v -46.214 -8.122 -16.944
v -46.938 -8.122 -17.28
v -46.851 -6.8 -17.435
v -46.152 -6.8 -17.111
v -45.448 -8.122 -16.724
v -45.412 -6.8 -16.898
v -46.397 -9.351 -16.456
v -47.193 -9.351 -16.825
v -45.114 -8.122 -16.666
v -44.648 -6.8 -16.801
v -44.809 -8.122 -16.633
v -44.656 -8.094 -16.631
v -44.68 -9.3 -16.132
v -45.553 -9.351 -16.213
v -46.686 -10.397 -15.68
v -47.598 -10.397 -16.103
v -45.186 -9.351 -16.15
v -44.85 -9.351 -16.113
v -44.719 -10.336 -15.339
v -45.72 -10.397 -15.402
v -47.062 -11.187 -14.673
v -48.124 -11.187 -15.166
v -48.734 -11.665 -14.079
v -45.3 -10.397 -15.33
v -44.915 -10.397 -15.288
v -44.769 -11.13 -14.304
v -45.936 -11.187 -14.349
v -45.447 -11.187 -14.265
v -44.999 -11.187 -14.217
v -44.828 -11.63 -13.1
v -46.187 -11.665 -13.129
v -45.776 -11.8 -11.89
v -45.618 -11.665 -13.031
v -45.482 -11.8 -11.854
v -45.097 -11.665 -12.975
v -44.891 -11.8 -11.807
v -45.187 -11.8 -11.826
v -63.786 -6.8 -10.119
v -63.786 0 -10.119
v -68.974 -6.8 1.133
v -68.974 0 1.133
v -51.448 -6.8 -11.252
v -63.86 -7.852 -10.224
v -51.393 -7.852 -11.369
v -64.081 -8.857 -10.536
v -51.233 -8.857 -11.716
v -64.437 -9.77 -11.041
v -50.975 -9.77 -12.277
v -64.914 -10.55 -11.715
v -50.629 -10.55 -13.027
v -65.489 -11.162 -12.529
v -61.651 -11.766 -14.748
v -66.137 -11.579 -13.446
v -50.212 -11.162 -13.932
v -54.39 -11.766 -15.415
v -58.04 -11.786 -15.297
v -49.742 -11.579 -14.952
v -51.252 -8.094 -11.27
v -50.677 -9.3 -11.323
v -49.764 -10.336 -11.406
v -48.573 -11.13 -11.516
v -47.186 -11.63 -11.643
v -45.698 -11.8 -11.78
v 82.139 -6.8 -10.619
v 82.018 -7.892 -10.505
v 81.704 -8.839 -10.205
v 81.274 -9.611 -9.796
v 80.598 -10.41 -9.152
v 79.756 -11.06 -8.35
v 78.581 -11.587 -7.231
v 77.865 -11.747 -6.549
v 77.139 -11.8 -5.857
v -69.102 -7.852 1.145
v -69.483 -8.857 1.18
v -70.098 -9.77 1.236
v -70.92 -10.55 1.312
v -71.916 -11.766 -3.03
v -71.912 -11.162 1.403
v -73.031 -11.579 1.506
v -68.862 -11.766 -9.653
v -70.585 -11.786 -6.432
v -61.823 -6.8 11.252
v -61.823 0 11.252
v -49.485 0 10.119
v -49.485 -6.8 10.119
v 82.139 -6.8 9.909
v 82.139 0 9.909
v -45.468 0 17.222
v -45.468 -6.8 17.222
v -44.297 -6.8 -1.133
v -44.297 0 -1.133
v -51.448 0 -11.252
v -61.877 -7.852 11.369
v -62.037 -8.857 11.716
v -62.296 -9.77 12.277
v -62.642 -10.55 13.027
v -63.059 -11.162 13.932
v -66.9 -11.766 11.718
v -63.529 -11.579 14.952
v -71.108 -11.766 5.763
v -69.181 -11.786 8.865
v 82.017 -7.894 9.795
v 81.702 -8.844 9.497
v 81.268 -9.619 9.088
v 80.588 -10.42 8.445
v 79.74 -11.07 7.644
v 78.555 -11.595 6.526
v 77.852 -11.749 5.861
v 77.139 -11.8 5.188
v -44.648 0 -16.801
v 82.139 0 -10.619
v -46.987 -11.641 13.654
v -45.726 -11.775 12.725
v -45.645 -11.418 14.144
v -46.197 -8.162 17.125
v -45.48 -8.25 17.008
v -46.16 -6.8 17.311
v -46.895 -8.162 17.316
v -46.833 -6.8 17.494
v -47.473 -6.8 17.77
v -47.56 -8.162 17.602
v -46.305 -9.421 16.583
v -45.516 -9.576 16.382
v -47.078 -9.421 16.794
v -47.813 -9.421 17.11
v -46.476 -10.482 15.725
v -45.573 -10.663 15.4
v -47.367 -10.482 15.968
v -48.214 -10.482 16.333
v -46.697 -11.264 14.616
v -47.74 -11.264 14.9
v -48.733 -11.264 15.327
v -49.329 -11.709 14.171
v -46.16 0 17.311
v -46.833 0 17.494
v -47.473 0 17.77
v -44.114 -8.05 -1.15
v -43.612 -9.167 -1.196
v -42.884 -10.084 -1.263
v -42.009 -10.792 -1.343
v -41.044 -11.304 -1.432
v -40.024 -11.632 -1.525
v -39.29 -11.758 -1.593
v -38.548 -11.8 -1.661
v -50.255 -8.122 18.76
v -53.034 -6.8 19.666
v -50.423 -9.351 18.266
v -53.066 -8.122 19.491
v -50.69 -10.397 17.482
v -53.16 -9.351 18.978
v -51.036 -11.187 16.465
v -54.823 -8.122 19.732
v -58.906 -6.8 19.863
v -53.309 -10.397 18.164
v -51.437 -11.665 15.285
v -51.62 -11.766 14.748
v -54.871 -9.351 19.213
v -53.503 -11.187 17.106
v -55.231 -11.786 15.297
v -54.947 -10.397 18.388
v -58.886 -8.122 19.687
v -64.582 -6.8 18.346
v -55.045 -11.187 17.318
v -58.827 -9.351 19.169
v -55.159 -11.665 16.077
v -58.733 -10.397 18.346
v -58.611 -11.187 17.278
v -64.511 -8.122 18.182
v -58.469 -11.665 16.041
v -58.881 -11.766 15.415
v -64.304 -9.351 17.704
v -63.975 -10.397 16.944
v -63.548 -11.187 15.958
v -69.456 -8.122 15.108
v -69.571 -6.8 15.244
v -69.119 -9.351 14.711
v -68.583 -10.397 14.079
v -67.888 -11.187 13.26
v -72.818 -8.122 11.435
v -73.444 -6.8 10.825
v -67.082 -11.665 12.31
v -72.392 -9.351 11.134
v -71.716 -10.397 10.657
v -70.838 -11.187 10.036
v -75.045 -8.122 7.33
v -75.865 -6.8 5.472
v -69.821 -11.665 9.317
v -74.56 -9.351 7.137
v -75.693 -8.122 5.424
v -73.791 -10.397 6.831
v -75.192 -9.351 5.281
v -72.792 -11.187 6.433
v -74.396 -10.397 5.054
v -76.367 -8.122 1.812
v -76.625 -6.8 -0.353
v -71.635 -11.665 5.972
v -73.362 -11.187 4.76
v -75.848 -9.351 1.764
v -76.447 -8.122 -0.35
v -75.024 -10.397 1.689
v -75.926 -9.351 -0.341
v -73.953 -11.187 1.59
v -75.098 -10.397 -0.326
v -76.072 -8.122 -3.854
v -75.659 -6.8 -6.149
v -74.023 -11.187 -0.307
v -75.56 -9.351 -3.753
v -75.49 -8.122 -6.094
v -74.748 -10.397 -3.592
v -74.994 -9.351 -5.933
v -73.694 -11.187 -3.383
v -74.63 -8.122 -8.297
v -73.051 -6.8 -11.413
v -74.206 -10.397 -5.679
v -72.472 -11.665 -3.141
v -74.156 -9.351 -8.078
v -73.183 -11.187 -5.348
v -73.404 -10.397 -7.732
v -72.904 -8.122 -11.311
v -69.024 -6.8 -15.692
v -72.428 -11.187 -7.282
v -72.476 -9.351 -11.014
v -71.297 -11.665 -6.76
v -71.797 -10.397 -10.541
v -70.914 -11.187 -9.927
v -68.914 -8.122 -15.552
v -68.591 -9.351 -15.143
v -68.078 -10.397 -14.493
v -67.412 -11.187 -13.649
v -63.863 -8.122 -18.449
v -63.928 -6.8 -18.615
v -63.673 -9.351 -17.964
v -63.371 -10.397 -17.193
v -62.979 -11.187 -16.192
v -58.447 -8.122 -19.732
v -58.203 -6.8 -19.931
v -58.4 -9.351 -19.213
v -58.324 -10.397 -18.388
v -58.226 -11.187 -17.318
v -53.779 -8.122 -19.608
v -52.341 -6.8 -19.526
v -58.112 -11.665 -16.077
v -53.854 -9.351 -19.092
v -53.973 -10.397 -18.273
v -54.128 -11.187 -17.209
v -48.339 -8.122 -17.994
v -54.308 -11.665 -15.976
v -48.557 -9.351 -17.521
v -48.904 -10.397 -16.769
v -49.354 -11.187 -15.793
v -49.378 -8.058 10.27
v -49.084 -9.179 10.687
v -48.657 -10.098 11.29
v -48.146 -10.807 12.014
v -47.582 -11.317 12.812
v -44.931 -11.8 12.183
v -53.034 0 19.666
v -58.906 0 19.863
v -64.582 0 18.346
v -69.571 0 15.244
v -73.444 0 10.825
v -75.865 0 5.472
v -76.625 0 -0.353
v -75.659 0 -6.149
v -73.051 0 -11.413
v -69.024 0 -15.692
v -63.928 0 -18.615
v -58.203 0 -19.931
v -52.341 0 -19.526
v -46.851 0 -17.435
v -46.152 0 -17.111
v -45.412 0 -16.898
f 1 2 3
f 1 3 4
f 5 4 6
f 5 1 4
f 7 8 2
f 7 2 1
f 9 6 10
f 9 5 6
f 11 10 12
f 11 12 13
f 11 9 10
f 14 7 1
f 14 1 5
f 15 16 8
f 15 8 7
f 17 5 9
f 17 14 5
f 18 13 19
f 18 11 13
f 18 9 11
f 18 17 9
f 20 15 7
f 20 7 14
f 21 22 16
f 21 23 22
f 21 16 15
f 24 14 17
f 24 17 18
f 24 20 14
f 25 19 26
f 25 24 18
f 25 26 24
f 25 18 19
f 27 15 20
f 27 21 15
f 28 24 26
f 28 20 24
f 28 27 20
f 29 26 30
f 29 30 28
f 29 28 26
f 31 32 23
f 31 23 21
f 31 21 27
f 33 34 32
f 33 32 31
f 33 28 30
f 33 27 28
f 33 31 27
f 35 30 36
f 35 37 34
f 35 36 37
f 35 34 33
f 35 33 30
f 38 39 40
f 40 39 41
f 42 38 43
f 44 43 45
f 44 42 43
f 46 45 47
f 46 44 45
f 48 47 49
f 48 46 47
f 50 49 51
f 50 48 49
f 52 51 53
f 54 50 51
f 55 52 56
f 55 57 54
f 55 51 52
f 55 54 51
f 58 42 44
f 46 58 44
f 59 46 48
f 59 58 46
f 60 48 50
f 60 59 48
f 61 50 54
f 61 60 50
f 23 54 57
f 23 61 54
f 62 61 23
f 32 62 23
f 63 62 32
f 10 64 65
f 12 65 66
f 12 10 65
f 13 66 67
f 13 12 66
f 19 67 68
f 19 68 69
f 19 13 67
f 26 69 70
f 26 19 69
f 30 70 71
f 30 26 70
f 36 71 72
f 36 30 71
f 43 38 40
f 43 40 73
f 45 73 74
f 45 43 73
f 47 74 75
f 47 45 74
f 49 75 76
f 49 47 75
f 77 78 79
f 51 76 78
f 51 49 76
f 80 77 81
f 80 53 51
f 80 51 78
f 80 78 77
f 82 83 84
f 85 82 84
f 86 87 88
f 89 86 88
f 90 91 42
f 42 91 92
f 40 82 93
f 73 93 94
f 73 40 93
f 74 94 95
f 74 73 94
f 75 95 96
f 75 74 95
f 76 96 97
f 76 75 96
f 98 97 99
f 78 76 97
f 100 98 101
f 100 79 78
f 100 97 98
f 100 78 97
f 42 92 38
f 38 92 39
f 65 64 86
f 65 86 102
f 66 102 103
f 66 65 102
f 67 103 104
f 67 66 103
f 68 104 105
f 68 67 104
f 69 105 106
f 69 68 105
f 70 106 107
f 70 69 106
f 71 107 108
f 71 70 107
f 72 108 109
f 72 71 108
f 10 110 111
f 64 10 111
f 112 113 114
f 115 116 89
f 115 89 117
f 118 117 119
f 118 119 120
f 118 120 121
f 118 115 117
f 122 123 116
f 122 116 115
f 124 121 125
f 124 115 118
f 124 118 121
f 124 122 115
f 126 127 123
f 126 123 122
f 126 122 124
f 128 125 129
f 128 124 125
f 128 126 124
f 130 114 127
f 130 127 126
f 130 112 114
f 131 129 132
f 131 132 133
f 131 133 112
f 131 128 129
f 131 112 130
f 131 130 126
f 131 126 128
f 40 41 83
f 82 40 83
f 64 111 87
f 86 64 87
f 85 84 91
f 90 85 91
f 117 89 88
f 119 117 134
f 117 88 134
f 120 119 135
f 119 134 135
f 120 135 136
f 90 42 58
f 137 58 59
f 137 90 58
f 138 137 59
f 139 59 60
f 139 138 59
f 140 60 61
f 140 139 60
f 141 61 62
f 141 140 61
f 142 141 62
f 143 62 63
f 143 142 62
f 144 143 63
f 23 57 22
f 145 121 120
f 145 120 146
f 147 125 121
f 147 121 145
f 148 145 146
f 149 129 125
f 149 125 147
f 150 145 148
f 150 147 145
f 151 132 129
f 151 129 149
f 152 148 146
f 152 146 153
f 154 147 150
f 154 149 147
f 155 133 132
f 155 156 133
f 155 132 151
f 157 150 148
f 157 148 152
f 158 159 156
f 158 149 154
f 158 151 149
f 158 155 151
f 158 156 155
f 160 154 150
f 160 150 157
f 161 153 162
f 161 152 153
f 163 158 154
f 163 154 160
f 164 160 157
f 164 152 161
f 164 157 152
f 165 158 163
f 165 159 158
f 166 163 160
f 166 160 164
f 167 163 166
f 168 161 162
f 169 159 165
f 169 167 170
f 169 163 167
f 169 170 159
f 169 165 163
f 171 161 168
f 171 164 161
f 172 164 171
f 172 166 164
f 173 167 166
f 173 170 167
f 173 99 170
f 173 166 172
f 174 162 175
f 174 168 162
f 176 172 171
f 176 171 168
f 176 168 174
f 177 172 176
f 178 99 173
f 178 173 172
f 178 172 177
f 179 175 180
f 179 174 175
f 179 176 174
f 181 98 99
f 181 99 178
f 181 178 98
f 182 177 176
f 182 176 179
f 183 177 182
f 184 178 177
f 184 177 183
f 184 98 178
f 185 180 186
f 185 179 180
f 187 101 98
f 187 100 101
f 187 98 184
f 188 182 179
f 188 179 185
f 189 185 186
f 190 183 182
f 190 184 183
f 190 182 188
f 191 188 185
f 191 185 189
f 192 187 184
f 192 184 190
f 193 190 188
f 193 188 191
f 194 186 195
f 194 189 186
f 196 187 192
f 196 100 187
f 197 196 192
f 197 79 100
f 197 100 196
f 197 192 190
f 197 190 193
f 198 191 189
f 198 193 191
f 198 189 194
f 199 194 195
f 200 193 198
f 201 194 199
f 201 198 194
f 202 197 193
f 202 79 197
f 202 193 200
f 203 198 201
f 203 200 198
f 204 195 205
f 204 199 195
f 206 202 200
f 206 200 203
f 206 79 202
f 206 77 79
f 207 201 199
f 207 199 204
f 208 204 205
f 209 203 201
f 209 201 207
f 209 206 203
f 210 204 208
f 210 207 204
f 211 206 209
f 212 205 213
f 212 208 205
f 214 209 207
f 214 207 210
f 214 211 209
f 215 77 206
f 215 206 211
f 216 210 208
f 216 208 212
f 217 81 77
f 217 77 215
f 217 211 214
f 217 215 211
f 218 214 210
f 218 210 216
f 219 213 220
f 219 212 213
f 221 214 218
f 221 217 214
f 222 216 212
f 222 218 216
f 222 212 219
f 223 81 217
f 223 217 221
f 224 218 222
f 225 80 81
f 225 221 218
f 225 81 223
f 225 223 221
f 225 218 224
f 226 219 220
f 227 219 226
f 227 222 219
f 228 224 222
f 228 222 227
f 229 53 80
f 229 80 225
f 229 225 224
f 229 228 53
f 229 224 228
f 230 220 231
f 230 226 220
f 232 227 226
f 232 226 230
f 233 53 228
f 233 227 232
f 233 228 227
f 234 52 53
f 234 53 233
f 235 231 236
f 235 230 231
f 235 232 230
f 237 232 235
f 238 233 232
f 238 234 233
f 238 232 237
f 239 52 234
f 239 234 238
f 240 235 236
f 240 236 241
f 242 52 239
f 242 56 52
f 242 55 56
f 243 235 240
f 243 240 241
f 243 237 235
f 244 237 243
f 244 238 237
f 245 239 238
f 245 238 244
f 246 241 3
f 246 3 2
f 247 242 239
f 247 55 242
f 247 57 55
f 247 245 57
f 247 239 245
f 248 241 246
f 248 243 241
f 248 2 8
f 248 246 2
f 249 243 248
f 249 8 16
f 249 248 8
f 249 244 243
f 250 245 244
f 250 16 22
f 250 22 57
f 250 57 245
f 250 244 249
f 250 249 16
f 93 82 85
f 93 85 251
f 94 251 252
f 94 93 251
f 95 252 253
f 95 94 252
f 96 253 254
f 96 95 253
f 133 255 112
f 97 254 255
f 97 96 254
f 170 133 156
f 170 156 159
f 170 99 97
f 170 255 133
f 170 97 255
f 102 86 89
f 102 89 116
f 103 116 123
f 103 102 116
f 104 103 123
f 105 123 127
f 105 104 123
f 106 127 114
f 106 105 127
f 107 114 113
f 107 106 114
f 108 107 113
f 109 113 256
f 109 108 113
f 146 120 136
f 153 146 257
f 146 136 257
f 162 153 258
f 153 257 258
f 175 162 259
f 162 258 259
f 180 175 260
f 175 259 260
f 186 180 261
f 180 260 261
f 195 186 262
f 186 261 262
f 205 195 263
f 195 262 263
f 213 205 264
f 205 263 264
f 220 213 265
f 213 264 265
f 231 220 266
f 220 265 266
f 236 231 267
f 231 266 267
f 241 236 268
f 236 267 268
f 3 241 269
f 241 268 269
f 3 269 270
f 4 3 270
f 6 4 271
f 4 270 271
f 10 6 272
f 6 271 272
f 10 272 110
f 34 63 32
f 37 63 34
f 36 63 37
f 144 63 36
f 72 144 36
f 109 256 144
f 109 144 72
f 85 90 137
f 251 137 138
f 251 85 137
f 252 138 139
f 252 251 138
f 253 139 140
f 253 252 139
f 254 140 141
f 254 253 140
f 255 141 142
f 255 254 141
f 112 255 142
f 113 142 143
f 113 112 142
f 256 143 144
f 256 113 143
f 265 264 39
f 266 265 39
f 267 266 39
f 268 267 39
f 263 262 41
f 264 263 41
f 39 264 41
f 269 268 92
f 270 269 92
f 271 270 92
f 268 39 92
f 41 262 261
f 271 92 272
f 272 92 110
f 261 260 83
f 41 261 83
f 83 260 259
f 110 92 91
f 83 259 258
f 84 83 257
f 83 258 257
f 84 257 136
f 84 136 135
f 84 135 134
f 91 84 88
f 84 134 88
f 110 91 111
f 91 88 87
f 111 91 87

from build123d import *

# Parameters (mm, degrees)
F1_DEPTH      = 11.8
F2_T3_ANGLE   = 23.9952218253
F2_T6_ANGLE   = 236.5757489995
F2_T9_ANGLE   = 26.5092715393
F2_T12_DEPTH  = 139.4367119933
F2_T15_DEPTH  = 45.5289069563
F2_T18_DEPTH  = 140.3160479541
F2_T21_DEPTH  = 37.3901770892
F2_T26_DEPTH  = 37.3901770892
F2_T31_DEPTH  = 37.3901770892
F2_T36_DEPTH  = 37.3901770892
F2_T41_DEPTH  = 37.3901770892
F2_T46_DEPTH  = 37.3901770892
F2_T52_DEPTH  = 37.3901770892
F2_T56_DEPTH  = 37.3901770892
F2_T62_DEPTH  = 37.3901770892
F2_T66_DEPTH  = 37.3901770892
F2_T72_DEPTH  = 37.3901770892
F2_T76_DEPTH  = 37.3901770892
F2_T82_DEPTH  = 37.3901770892
F2_T86_DEPTH  = 37.3901770892
F2_T92_DEPTH  = 37.3901770892
F2_T96_DEPTH  = 37.3901770892
F2_T102_DEPTH = 37.3901770892
F2_T106_DEPTH = 37.3901770892


# Not quite as in the source:
# - a fillet or chamfer that OpenCascade refuses, or shapes differently, is made with other operations: its cross-section is extruded or revolved along the edge and cut away or added


with BuildPart() as f1:
    # F0 (on Front) → F1 (new body)
    with BuildSketch(Plane.XZ):
        with BuildLine():
            ThreePointArc((-45.4681624589, 17.2222085509), (-46.4995658162, 17.3907127083), (-47.4734123647, 17.7699348549))
            ThreePointArc((-47.4734123647, 17.7699348549), (-76.6250444945, -0.3533911925), (-46.8510355825, -17.4349893659))
            ThreePointArc((-46.8510355825, -17.4349893659), (-45.7861203938, -16.9901072457), (-44.6475715962, -16.8012393137))
            Line((-44.6475715962, -16.8012393137), (82.1385234594, -10.6194149703))
            Line((82.1385234594, -10.6194149703), (82.1385234594, 9.909491986))
            Line((82.1385234594, 9.909491986), (-45.4681624589, 17.2222085509))
        make_face()
        Polygon((-49.4849642992, 10.1187057679), (-44.2971102089, -1.1330789012), (-51.4475145251, -11.2517846691), (-63.7857729316, -10.1187057679), (-68.9736270219, 1.1330789012), (-61.8232227057, 11.2517846691), align=None, mode=Mode.SUBTRACT)
    extrude(amount=F1_DEPTH)

    # F2: fillet of radius 5 on 12 edges, made by hand


with BuildPart() as f2_tool1:
    # F2_s2 → F2_t3 (revolve)
    with BuildSketch(Plane(origin=(-46.3030483671, 0, 2.6534743565), x_dir=(0, 1, 0), z_dir=(0.9983620051, 0, -0.0572128202))):
        with BuildLine():
            ThreePointArc((-6.8, 14.5926368593), (-10.3355339059, 13.1281707652), (-11.8, 9.5926368593))
            Line((-11.8, 9.5926368593), (-11.8, 14.5926368593))
            Line((-11.8, 14.5926368593), (-6.8, 14.5926368593))
        make_face()
    revolve(axis=Axis((-45.1820983581, -11.8, 22.2140185763), (0, 1, 0)), revolution_arc=F2_T3_ANGLE)


with BuildPart() as f2_tool4:
    # F2_s5 → F2_t6 (revolve)
    with BuildSketch(Plane(origin=(-44.7416696351, 0, 23.0682455015), x_dir=(0, 1, 0), z_dir=(0.8888167443, 0, -0.4582628013))):
        with BuildLine():
            ThreePointArc((-6.8, -5.9610832949), (-10.3355339059, -7.425549389), (-11.8, -10.9610832949))
            Line((-11.8, -10.9610832949), (-11.8, -5.9610832949))
            Line((-11.8, -5.9610832949), (-6.8, -5.9610832949))
        make_face()
    revolve(axis=Axis((-56.6353686154, -11.8, 0), (0, -1, 0)), revolution_arc=F2_T6_ANGLE)


with BuildPart() as f2_tool7:
    # F2_s8 → F2_t9 (revolve)
    with BuildSketch(Plane(origin=(-43.0708942729, 0, -24.1709337899), x_dir=(0, 1, 0), z_dir=(-0.8720634381, 0, -0.4893928482))):
        with BuildLine():
            ThreePointArc((-6.8, -7.7241449756), (-10.3355339059, -9.1886110696), (-11.8, -12.7241449756))
            Line((-11.8, -12.7241449756), (-11.8, -7.7241449756))
            Line((-11.8, -7.7241449756), (-6.8, -7.7241449756))
        make_face()
    revolve(axis=Axis((-44.4040713414, -11.8, -21.7953065565), (0, 1, 0)), revolution_arc=F2_T9_ANGLE)


with BuildPart() as f2_tool10:
    # F2_s11 → F2_t12 (new body)
    with BuildSketch(Plane(origin=(-45.3589315248, 0, -2.2116064618), x_dir=(0, 1, 0), z_dir=(0.9988134486, 0, 0.048700051))):
        with BuildLine():
            ThreePointArc((-6.8, -14.6069647669), (-10.3355339059, -13.1424986728), (-11.8, -9.6069647669))
            Line((-11.8, -9.6069647669), (-11.8, -14.6069647669))
            Line((-11.8, -14.6069647669), (-6.8, -14.6069647669))
        make_face()
    extrude(amount=F2_T12_DEPTH)


with BuildPart() as f2_tool13:
    # F2_s14 → F2_t15 (new body)
    with BuildSketch(Plane.XY.offset(-23.1194149703)):
        with BuildLine():
            ThreePointArc((82.1385234594, -6.8), (80.6740573654, -10.3355339059), (77.1385234594, -11.8))
            Line((77.1385234594, -11.8), (82.1385234594, -11.8))
            Line((82.1385234594, -11.8), (82.1385234594, -6.8))
        make_face()
    extrude(amount=F2_T15_DEPTH)


with BuildPart() as f2_tool16:
    # F2_s17 → F2_t18 (new body)
    with BuildSketch(Plane(origin=(93.7831626148, 0, -5.3744024604), x_dir=(0, 1, 0), z_dir=(-0.9983620051, 0, 0.0572128202))):
        with BuildLine():
            ThreePointArc((-6.8, -14.5926368593), (-10.3355339059, -13.1281707652), (-11.8, -9.5926368593))
            Line((-11.8, -9.5926368593), (-11.8, -14.5926368593))
            Line((-11.8, -14.5926368593), (-6.8, -14.5926368593))
        make_face()
    extrude(amount=F2_T18_DEPTH)


with BuildPart() as f2_tool19:
    # F2_s20 → F2_t21 (new body)
    with BuildSketch(Plane(origin=(-29.6512532209, 0, -41.9601876654), x_dir=(0, 1, 0), z_dir=(0.5771026729, 0, 0.8166716016))):
        with BuildLine():
            ThreePointArc((-6.8, 56.9827053125), (-10.3355339059, 58.4471714066), (-11.8, 61.9827053125))
            Line((-11.8, 61.9827053125), (-11.8, 56.9827053125))
            Line((-11.8, 56.9827053125), (-6.8, 56.9827053125))
        make_face()
    extrude(amount=F2_T21_DEPTH)

    split(bisect_by=Plane(origin=(-56.450638263, 0, -26.0276643418), x_dir=(0, 1, 0), z_dir=(0.9081213762, 0, 0.4187070171)), keep=Keep.TOP)

    split(bisect_by=Plane(origin=(0.5076300556, 0, 5.5276563658), x_dir=(0, 1, 0), z_dir=(-0.0914497745, 0, -0.99580969)), keep=Keep.TOP)


with BuildPart() as f2_tool24:
    # F2_s25 → F2_t26 (new body)
    with BuildSketch(Plane(origin=(-74.7784738866, 0, 6.867250485), x_dir=(0, 1, 0), z_dir=(0.99580969, 0, -0.0914497745))):
        with BuildLine():
            ThreePointArc((-6.8, 5.5509164263), (-10.3355339059, 7.0153825204), (-11.8, 10.5509164263))
            Line((-11.8, 10.5509164263), (-11.8, 5.5509164263))
            Line((-11.8, 5.5509164263), (-6.8, 5.5509164263))
        make_face()
    extrude(amount=F2_T26_DEPTH)

    split(bisect_by=Plane(origin=(-46.5361572126, 0, 32.8848715463), x_dir=(0, 1, 0), z_dir=(0.8166716016, 0, -0.5771026729)), keep=Keep.TOP)

    split(bisect_by=Plane(origin=(-36.9619755402, 0, -17.0420374751), x_dir=(0, 1, 0), z_dir=(-0.9081213762, 0, -0.4187070171)), keep=Keep.TOP)


with BuildPart() as f2_tool29:
    # F2_s30 → F2_t31 (new body)
    with BuildSketch(Plane(origin=(-17.7568264726, 0, 38.512260445), x_dir=(0, 1, 0), z_dir=(0.4187070171, 0, -0.9081213762))):
        with BuildLine():
            ThreePointArc((-6.8, -40.7015807695), (-10.3355339059, -39.2371146755), (-11.8, -35.7015807695))
            Line((-11.8, -35.7015807695), (-11.8, -40.7015807695))
            Line((-11.8, -40.7015807695), (-6.8, -40.7015807695))
        make_face()
    extrude(amount=F2_T31_DEPTH)

    split(bisect_by=Plane(origin=(0.5076300556, 0, 5.5276563658), x_dir=(0, 1, 0), z_dir=(-0.0914497745, 0, -0.99580969)), keep=Keep.TOP)

    split(bisect_by=Plane(origin=(-29.0100447157, 0, 20.500007976), x_dir=(0, 1, 0), z_dir=(-0.8166716016, 0, 0.5771026729)), keep=Keep.TOP)


with BuildPart() as f2_tool34:
    # F2_s35 → F2_t36 (new body)
    with BuildSketch(Plane(origin=(-8.0732820816, 0, -11.4246918569), x_dir=(0, 1, 0), z_dir=(-0.5771026729, 0, -0.8166716016))):
        with BuildLine():
            ThreePointArc((-6.8, -35.5222890792), (-10.3355339059, -34.0578229851), (-11.8, -30.5222890792))
            Line((-11.8, -30.5222890792), (-11.8, -35.5222890792))
            Line((-11.8, -35.5222890792), (-6.8, -35.5222890792))
        make_face()
    extrude(amount=F2_T36_DEPTH)

    split(bisect_by=Plane(origin=(-36.9619755402, 0, -17.0420374751), x_dir=(0, 1, 0), z_dir=(-0.9081213762, 0, -0.4187070171)), keep=Keep.TOP)

    split(bisect_by=Plane(origin=(-1.4549201703, 0, -15.8428340712), x_dir=(0, 1, 0), z_dir=(0.0914497745, 0, 0.99580969)), keep=Keep.TOP)


with BuildPart() as f2_tool39:
    # F2_s40 → F2_t41 (new body)
    with BuildSketch(Plane(origin=(-37.5449732296, 0, 3.4479272205), x_dir=(0, 1, 0), z_dir=(-0.99580969, 0, 0.0914497745))):
        with BuildLine():
            ThreePointArc((-6.8, 15.909499807), (-10.3355339059, 17.3739659011), (-11.8, 20.909499807))
            Line((-11.8, 20.909499807), (-11.8, 15.909499807))
            Line((-11.8, 15.909499807), (-6.8, 15.909499807))
        make_face()
    extrude(amount=F2_T41_DEPTH)

    split(bisect_by=Plane(origin=(-29.0100447157, 0, 20.500007976), x_dir=(0, 1, 0), z_dir=(-0.8166716016, 0, 0.5771026729)), keep=Keep.TOP)

    split(bisect_by=Plane(origin=(-56.450638263, 0, -26.0276643418), x_dir=(0, 1, 0), z_dir=(0.9081213762, 0, 0.4187070171)), keep=Keep.TOP)


with BuildPart() as f2_tool44:
    # F2_s45 → F2_t46 (new body)
    with BuildSketch(Plane(origin=(-2.1012969549, 0, 4.5574413719), x_dir=(0, 1, 0), z_dir=(-0.4187070171, 0, 0.9081213762))):
        with BuildLine():
            ThreePointArc((-6.8, 62.1619970029), (-10.3355339059, 63.626463097), (-11.8, 67.1619970029))
            Line((-11.8, 67.1619970029), (-11.8, 62.1619970029))
            Line((-11.8, 62.1619970029), (-6.8, 62.1619970029))
        make_face()
    extrude(amount=F2_T46_DEPTH)

    split(bisect_by=Plane(origin=(-46.5361572126, 0, 32.8848715463), x_dir=(0, 1, 0), z_dir=(0.8166716016, 0, -0.5771026729)), keep=Keep.TOP)

    split(bisect_by=Plane(origin=(-1.4549201703, 0, -15.8428340712), x_dir=(0, 1, 0), z_dir=(0.0914497745, 0, 0.99580969)), keep=Keep.TOP)


with BuildPart() as f2_tool50:
    # F2_s51 → F2_t52 (new body)
    with BuildSketch(Plane(origin=(-29.6512532209, 0, -41.9601876654), x_dir=(0, 1, 0), z_dir=(0.5771026729, 0, 0.8166716016))):
        with BuildLine():
            ThreePointArc((-6.8, 56.9827053125), (-10.3355339059, 58.4471714066), (-11.8, 61.9827053125))
            Line((-11.8, 61.9827053125), (-11.8, 56.9827053125))
            Line((-11.8, 56.9827053125), (-6.8, 56.9827053125))
        make_face()
    extrude(amount=F2_T52_DEPTH)

    split(bisect_by=Plane(origin=(-56.450638263, 0, -26.0276643418), x_dir=(0, 1, 0), z_dir=(-0.9081213762, 0, -0.4187070171)), keep=Keep.TOP)


with BuildPart() as f2_tool54:
    # F2_s55 → F2_t56 (new body)
    with BuildSketch(Plane(origin=(-2.1012969549, 0, 4.5574413719), x_dir=(0, 1, 0), z_dir=(-0.4187070171, 0, 0.9081213762))):
        with BuildLine():
            ThreePointArc((-6.8, 62.1619970029), (-10.3355339059, 63.626463097), (-11.8, 67.1619970029))
            Line((-11.8, 67.1619970029), (-11.8, 62.1619970029))
            Line((-11.8, 62.1619970029), (-6.8, 62.1619970029))
        make_face()
    extrude(amount=F2_T56_DEPTH)

    split(bisect_by=Plane(origin=(-46.5361572126, 0, 32.8848715463), x_dir=(0, 1, 0), z_dir=(-0.8166716016, 0, 0.5771026729)), keep=Keep.TOP)


with BuildPart() as f2_tool50_1:
    add(f2_tool50.part)

    # F2_t58: intersect F2_tool54
    add(f2_tool54.part, mode=Mode.INTERSECT)


with BuildPart() as f2_tool60:
    # F2_s61 → F2_t62 (new body)
    with BuildSketch(Plane(origin=(-29.6512532209, 0, -41.9601876654), x_dir=(0, 1, 0), z_dir=(0.5771026729, 0, 0.8166716016))):
        with BuildLine():
            ThreePointArc((-6.8, 56.9827053125), (-10.3355339059, 58.4471714066), (-11.8, 61.9827053125))
            Line((-11.8, 61.9827053125), (-11.8, 56.9827053125))
            Line((-11.8, 56.9827053125), (-6.8, 56.9827053125))
        make_face()
    extrude(amount=F2_T62_DEPTH)

    split(bisect_by=Plane(origin=(0.5076300556, 0, 5.5276563658), x_dir=(0, 1, 0), z_dir=(0.0914497745, 0, 0.99580969)), keep=Keep.TOP)


with BuildPart() as f2_tool64:
    # F2_s65 → F2_t66 (new body)
    with BuildSketch(Plane(origin=(-74.7784738866, 0, 6.867250485), x_dir=(0, 1, 0), z_dir=(0.99580969, 0, -0.0914497745))):
        with BuildLine():
            ThreePointArc((-6.8, 5.5509164263), (-10.3355339059, 7.0153825204), (-11.8, 10.5509164263))
            Line((-11.8, 10.5509164263), (-11.8, 5.5509164263))
            Line((-11.8, 5.5509164263), (-6.8, 5.5509164263))
        make_face()
    extrude(amount=F2_T66_DEPTH)

    split(bisect_by=Plane(origin=(-46.5361572126, 0, 32.8848715463), x_dir=(0, 1, 0), z_dir=(-0.8166716016, 0, 0.5771026729)), keep=Keep.TOP)


with BuildPart() as f2_tool60_1:
    add(f2_tool60.part)

    # F2_t68: intersect F2_tool64
    add(f2_tool64.part, mode=Mode.INTERSECT)


with BuildPart() as f2_tool70:
    # F2_s71 → F2_t72 (new body)
    with BuildSketch(Plane(origin=(-74.7784738866, 0, 6.867250485), x_dir=(0, 1, 0), z_dir=(0.99580969, 0, -0.0914497745))):
        with BuildLine():
            ThreePointArc((-6.8, 5.5509164263), (-10.3355339059, 7.0153825204), (-11.8, 10.5509164263))
            Line((-11.8, 10.5509164263), (-11.8, 5.5509164263))
            Line((-11.8, 5.5509164263), (-6.8, 5.5509164263))
        make_face()
    extrude(amount=F2_T72_DEPTH)

    split(bisect_by=Plane(origin=(-36.9619755402, 0, -17.0420374751), x_dir=(0, 1, 0), z_dir=(0.9081213762, 0, 0.4187070171)), keep=Keep.TOP)


with BuildPart() as f2_tool74:
    # F2_s75 → F2_t76 (new body)
    with BuildSketch(Plane(origin=(-17.7568264726, 0, 38.512260445), x_dir=(0, 1, 0), z_dir=(0.4187070171, 0, -0.9081213762))):
        with BuildLine():
            ThreePointArc((-6.8, -40.7015807695), (-10.3355339059, -39.2371146755), (-11.8, -35.7015807695))
            Line((-11.8, -35.7015807695), (-11.8, -40.7015807695))
            Line((-11.8, -40.7015807695), (-6.8, -40.7015807695))
        make_face()
    extrude(amount=F2_T76_DEPTH)

    split(bisect_by=Plane(origin=(0.5076300556, 0, 5.5276563658), x_dir=(0, 1, 0), z_dir=(0.0914497745, 0, 0.99580969)), keep=Keep.TOP)


with BuildPart() as f2_tool70_1:
    add(f2_tool70.part)

    # F2_t78: intersect F2_tool74
    add(f2_tool74.part, mode=Mode.INTERSECT)


with BuildPart() as f2_tool80:
    # F2_s81 → F2_t82 (new body)
    with BuildSketch(Plane(origin=(-17.7568264726, 0, 38.512260445), x_dir=(0, 1, 0), z_dir=(0.4187070171, 0, -0.9081213762))):
        with BuildLine():
            ThreePointArc((-6.8, -40.7015807695), (-10.3355339059, -39.2371146755), (-11.8, -35.7015807695))
            Line((-11.8, -35.7015807695), (-11.8, -40.7015807695))
            Line((-11.8, -40.7015807695), (-6.8, -40.7015807695))
        make_face()
    extrude(amount=F2_T82_DEPTH)

    split(bisect_by=Plane(origin=(-29.0100447157, 0, 20.500007976), x_dir=(0, 1, 0), z_dir=(0.8166716016, 0, -0.5771026729)), keep=Keep.TOP)


with BuildPart() as f2_tool84:
    # F2_s85 → F2_t86 (new body)
    with BuildSketch(Plane(origin=(-8.0732820816, 0, -11.4246918569), x_dir=(0, 1, 0), z_dir=(-0.5771026729, 0, -0.8166716016))):
        with BuildLine():
            ThreePointArc((-6.8, -35.5222890792), (-10.3355339059, -34.0578229851), (-11.8, -30.5222890792))
            Line((-11.8, -30.5222890792), (-11.8, -35.5222890792))
            Line((-11.8, -35.5222890792), (-6.8, -35.5222890792))
        make_face()
    extrude(amount=F2_T86_DEPTH)

    split(bisect_by=Plane(origin=(-36.9619755402, 0, -17.0420374751), x_dir=(0, 1, 0), z_dir=(0.9081213762, 0, 0.4187070171)), keep=Keep.TOP)


with BuildPart() as f2_tool80_1:
    add(f2_tool80.part)

    # F2_t88: intersect F2_tool84
    add(f2_tool84.part, mode=Mode.INTERSECT)


with BuildPart() as f2_tool90:
    # F2_s91 → F2_t92 (new body)
    with BuildSketch(Plane(origin=(-8.0732820816, 0, -11.4246918569), x_dir=(0, 1, 0), z_dir=(-0.5771026729, 0, -0.8166716016))):
        with BuildLine():
            ThreePointArc((-6.8, -35.5222890792), (-10.3355339059, -34.0578229851), (-11.8, -30.5222890792))
            Line((-11.8, -30.5222890792), (-11.8, -35.5222890792))
            Line((-11.8, -35.5222890792), (-6.8, -35.5222890792))
        make_face()
    extrude(amount=F2_T92_DEPTH)

    split(bisect_by=Plane(origin=(-1.4549201703, 0, -15.8428340712), x_dir=(0, 1, 0), z_dir=(-0.0914497745, 0, -0.99580969)), keep=Keep.TOP)


with BuildPart() as f2_tool94:
    # F2_s95 → F2_t96 (new body)
    with BuildSketch(Plane(origin=(-37.5449732296, 0, 3.4479272205), x_dir=(0, 1, 0), z_dir=(-0.99580969, 0, 0.0914497745))):
        with BuildLine():
            ThreePointArc((-6.8, 15.909499807), (-10.3355339059, 17.3739659011), (-11.8, 20.909499807))
            Line((-11.8, 20.909499807), (-11.8, 15.909499807))
            Line((-11.8, 15.909499807), (-6.8, 15.909499807))
        make_face()
    extrude(amount=F2_T96_DEPTH)

    split(bisect_by=Plane(origin=(-29.0100447157, 0, 20.500007976), x_dir=(0, 1, 0), z_dir=(0.8166716016, 0, -0.5771026729)), keep=Keep.TOP)


with BuildPart() as f2_tool90_1:
    add(f2_tool90.part)

    # F2_t98: intersect F2_tool94
    add(f2_tool94.part, mode=Mode.INTERSECT)


with BuildPart() as f2_tool100:
    # F2_s101 → F2_t102 (new body)
    with BuildSketch(Plane(origin=(-37.5449732296, 0, 3.4479272205), x_dir=(0, 1, 0), z_dir=(-0.99580969, 0, 0.0914497745))):
        with BuildLine():
            ThreePointArc((-6.8, 15.909499807), (-10.3355339059, 17.3739659011), (-11.8, 20.909499807))
            Line((-11.8, 20.909499807), (-11.8, 15.909499807))
            Line((-11.8, 15.909499807), (-6.8, 15.909499807))
        make_face()
    extrude(amount=F2_T102_DEPTH)

    split(bisect_by=Plane(origin=(-56.450638263, 0, -26.0276643418), x_dir=(0, 1, 0), z_dir=(-0.9081213762, 0, -0.4187070171)), keep=Keep.TOP)


with BuildPart() as f2_tool104:
    # F2_s105 → F2_t106 (new body)
    with BuildSketch(Plane(origin=(-2.1012969549, 0, 4.5574413719), x_dir=(0, 1, 0), z_dir=(-0.4187070171, 0, 0.9081213762))):
        with BuildLine():
            ThreePointArc((-6.8, 62.1619970029), (-10.3355339059, 63.626463097), (-11.8, 67.1619970029))
            Line((-11.8, 67.1619970029), (-11.8, 62.1619970029))
            Line((-11.8, 62.1619970029), (-6.8, 62.1619970029))
        make_face()
    extrude(amount=F2_T106_DEPTH)

    split(bisect_by=Plane(origin=(-1.4549201703, 0, -15.8428340712), x_dir=(0, 1, 0), z_dir=(-0.0914497745, 0, -0.99580969)), keep=Keep.TOP)


with BuildPart() as f2_tool100_1:
    add(f2_tool100.part)

    # F2_t108: intersect F2_tool104
    add(f2_tool104.part, mode=Mode.INTERSECT)


with BuildPart() as f1_1:
    add(f1.part)

    # F2_t109: cut F2_tool1, F2_tool4, F2_tool7, F2_tool10, F2_tool13, F2_tool16, F2_tool19, F2_tool24, F2_tool29, F2_tool34, F2_tool39, F2_tool44, F2_tool50, F2_tool60, F2_tool70, F2_tool80, F2_tool90, F2_tool100
    add([f2_tool1.part, f2_tool4.part, f2_tool7.part, f2_tool10.part, f2_tool13.part, f2_tool16.part, f2_tool19.part, f2_tool24.part, f2_tool29.part, f2_tool34.part, f2_tool39.part, f2_tool44.part, f2_tool50_1.part, f2_tool60_1.part, f2_tool70_1.part, f2_tool80_1.part, f2_tool90_1.part, f2_tool100_1.part], mode=Mode.SUBTRACT)


solid = f1_1.part
